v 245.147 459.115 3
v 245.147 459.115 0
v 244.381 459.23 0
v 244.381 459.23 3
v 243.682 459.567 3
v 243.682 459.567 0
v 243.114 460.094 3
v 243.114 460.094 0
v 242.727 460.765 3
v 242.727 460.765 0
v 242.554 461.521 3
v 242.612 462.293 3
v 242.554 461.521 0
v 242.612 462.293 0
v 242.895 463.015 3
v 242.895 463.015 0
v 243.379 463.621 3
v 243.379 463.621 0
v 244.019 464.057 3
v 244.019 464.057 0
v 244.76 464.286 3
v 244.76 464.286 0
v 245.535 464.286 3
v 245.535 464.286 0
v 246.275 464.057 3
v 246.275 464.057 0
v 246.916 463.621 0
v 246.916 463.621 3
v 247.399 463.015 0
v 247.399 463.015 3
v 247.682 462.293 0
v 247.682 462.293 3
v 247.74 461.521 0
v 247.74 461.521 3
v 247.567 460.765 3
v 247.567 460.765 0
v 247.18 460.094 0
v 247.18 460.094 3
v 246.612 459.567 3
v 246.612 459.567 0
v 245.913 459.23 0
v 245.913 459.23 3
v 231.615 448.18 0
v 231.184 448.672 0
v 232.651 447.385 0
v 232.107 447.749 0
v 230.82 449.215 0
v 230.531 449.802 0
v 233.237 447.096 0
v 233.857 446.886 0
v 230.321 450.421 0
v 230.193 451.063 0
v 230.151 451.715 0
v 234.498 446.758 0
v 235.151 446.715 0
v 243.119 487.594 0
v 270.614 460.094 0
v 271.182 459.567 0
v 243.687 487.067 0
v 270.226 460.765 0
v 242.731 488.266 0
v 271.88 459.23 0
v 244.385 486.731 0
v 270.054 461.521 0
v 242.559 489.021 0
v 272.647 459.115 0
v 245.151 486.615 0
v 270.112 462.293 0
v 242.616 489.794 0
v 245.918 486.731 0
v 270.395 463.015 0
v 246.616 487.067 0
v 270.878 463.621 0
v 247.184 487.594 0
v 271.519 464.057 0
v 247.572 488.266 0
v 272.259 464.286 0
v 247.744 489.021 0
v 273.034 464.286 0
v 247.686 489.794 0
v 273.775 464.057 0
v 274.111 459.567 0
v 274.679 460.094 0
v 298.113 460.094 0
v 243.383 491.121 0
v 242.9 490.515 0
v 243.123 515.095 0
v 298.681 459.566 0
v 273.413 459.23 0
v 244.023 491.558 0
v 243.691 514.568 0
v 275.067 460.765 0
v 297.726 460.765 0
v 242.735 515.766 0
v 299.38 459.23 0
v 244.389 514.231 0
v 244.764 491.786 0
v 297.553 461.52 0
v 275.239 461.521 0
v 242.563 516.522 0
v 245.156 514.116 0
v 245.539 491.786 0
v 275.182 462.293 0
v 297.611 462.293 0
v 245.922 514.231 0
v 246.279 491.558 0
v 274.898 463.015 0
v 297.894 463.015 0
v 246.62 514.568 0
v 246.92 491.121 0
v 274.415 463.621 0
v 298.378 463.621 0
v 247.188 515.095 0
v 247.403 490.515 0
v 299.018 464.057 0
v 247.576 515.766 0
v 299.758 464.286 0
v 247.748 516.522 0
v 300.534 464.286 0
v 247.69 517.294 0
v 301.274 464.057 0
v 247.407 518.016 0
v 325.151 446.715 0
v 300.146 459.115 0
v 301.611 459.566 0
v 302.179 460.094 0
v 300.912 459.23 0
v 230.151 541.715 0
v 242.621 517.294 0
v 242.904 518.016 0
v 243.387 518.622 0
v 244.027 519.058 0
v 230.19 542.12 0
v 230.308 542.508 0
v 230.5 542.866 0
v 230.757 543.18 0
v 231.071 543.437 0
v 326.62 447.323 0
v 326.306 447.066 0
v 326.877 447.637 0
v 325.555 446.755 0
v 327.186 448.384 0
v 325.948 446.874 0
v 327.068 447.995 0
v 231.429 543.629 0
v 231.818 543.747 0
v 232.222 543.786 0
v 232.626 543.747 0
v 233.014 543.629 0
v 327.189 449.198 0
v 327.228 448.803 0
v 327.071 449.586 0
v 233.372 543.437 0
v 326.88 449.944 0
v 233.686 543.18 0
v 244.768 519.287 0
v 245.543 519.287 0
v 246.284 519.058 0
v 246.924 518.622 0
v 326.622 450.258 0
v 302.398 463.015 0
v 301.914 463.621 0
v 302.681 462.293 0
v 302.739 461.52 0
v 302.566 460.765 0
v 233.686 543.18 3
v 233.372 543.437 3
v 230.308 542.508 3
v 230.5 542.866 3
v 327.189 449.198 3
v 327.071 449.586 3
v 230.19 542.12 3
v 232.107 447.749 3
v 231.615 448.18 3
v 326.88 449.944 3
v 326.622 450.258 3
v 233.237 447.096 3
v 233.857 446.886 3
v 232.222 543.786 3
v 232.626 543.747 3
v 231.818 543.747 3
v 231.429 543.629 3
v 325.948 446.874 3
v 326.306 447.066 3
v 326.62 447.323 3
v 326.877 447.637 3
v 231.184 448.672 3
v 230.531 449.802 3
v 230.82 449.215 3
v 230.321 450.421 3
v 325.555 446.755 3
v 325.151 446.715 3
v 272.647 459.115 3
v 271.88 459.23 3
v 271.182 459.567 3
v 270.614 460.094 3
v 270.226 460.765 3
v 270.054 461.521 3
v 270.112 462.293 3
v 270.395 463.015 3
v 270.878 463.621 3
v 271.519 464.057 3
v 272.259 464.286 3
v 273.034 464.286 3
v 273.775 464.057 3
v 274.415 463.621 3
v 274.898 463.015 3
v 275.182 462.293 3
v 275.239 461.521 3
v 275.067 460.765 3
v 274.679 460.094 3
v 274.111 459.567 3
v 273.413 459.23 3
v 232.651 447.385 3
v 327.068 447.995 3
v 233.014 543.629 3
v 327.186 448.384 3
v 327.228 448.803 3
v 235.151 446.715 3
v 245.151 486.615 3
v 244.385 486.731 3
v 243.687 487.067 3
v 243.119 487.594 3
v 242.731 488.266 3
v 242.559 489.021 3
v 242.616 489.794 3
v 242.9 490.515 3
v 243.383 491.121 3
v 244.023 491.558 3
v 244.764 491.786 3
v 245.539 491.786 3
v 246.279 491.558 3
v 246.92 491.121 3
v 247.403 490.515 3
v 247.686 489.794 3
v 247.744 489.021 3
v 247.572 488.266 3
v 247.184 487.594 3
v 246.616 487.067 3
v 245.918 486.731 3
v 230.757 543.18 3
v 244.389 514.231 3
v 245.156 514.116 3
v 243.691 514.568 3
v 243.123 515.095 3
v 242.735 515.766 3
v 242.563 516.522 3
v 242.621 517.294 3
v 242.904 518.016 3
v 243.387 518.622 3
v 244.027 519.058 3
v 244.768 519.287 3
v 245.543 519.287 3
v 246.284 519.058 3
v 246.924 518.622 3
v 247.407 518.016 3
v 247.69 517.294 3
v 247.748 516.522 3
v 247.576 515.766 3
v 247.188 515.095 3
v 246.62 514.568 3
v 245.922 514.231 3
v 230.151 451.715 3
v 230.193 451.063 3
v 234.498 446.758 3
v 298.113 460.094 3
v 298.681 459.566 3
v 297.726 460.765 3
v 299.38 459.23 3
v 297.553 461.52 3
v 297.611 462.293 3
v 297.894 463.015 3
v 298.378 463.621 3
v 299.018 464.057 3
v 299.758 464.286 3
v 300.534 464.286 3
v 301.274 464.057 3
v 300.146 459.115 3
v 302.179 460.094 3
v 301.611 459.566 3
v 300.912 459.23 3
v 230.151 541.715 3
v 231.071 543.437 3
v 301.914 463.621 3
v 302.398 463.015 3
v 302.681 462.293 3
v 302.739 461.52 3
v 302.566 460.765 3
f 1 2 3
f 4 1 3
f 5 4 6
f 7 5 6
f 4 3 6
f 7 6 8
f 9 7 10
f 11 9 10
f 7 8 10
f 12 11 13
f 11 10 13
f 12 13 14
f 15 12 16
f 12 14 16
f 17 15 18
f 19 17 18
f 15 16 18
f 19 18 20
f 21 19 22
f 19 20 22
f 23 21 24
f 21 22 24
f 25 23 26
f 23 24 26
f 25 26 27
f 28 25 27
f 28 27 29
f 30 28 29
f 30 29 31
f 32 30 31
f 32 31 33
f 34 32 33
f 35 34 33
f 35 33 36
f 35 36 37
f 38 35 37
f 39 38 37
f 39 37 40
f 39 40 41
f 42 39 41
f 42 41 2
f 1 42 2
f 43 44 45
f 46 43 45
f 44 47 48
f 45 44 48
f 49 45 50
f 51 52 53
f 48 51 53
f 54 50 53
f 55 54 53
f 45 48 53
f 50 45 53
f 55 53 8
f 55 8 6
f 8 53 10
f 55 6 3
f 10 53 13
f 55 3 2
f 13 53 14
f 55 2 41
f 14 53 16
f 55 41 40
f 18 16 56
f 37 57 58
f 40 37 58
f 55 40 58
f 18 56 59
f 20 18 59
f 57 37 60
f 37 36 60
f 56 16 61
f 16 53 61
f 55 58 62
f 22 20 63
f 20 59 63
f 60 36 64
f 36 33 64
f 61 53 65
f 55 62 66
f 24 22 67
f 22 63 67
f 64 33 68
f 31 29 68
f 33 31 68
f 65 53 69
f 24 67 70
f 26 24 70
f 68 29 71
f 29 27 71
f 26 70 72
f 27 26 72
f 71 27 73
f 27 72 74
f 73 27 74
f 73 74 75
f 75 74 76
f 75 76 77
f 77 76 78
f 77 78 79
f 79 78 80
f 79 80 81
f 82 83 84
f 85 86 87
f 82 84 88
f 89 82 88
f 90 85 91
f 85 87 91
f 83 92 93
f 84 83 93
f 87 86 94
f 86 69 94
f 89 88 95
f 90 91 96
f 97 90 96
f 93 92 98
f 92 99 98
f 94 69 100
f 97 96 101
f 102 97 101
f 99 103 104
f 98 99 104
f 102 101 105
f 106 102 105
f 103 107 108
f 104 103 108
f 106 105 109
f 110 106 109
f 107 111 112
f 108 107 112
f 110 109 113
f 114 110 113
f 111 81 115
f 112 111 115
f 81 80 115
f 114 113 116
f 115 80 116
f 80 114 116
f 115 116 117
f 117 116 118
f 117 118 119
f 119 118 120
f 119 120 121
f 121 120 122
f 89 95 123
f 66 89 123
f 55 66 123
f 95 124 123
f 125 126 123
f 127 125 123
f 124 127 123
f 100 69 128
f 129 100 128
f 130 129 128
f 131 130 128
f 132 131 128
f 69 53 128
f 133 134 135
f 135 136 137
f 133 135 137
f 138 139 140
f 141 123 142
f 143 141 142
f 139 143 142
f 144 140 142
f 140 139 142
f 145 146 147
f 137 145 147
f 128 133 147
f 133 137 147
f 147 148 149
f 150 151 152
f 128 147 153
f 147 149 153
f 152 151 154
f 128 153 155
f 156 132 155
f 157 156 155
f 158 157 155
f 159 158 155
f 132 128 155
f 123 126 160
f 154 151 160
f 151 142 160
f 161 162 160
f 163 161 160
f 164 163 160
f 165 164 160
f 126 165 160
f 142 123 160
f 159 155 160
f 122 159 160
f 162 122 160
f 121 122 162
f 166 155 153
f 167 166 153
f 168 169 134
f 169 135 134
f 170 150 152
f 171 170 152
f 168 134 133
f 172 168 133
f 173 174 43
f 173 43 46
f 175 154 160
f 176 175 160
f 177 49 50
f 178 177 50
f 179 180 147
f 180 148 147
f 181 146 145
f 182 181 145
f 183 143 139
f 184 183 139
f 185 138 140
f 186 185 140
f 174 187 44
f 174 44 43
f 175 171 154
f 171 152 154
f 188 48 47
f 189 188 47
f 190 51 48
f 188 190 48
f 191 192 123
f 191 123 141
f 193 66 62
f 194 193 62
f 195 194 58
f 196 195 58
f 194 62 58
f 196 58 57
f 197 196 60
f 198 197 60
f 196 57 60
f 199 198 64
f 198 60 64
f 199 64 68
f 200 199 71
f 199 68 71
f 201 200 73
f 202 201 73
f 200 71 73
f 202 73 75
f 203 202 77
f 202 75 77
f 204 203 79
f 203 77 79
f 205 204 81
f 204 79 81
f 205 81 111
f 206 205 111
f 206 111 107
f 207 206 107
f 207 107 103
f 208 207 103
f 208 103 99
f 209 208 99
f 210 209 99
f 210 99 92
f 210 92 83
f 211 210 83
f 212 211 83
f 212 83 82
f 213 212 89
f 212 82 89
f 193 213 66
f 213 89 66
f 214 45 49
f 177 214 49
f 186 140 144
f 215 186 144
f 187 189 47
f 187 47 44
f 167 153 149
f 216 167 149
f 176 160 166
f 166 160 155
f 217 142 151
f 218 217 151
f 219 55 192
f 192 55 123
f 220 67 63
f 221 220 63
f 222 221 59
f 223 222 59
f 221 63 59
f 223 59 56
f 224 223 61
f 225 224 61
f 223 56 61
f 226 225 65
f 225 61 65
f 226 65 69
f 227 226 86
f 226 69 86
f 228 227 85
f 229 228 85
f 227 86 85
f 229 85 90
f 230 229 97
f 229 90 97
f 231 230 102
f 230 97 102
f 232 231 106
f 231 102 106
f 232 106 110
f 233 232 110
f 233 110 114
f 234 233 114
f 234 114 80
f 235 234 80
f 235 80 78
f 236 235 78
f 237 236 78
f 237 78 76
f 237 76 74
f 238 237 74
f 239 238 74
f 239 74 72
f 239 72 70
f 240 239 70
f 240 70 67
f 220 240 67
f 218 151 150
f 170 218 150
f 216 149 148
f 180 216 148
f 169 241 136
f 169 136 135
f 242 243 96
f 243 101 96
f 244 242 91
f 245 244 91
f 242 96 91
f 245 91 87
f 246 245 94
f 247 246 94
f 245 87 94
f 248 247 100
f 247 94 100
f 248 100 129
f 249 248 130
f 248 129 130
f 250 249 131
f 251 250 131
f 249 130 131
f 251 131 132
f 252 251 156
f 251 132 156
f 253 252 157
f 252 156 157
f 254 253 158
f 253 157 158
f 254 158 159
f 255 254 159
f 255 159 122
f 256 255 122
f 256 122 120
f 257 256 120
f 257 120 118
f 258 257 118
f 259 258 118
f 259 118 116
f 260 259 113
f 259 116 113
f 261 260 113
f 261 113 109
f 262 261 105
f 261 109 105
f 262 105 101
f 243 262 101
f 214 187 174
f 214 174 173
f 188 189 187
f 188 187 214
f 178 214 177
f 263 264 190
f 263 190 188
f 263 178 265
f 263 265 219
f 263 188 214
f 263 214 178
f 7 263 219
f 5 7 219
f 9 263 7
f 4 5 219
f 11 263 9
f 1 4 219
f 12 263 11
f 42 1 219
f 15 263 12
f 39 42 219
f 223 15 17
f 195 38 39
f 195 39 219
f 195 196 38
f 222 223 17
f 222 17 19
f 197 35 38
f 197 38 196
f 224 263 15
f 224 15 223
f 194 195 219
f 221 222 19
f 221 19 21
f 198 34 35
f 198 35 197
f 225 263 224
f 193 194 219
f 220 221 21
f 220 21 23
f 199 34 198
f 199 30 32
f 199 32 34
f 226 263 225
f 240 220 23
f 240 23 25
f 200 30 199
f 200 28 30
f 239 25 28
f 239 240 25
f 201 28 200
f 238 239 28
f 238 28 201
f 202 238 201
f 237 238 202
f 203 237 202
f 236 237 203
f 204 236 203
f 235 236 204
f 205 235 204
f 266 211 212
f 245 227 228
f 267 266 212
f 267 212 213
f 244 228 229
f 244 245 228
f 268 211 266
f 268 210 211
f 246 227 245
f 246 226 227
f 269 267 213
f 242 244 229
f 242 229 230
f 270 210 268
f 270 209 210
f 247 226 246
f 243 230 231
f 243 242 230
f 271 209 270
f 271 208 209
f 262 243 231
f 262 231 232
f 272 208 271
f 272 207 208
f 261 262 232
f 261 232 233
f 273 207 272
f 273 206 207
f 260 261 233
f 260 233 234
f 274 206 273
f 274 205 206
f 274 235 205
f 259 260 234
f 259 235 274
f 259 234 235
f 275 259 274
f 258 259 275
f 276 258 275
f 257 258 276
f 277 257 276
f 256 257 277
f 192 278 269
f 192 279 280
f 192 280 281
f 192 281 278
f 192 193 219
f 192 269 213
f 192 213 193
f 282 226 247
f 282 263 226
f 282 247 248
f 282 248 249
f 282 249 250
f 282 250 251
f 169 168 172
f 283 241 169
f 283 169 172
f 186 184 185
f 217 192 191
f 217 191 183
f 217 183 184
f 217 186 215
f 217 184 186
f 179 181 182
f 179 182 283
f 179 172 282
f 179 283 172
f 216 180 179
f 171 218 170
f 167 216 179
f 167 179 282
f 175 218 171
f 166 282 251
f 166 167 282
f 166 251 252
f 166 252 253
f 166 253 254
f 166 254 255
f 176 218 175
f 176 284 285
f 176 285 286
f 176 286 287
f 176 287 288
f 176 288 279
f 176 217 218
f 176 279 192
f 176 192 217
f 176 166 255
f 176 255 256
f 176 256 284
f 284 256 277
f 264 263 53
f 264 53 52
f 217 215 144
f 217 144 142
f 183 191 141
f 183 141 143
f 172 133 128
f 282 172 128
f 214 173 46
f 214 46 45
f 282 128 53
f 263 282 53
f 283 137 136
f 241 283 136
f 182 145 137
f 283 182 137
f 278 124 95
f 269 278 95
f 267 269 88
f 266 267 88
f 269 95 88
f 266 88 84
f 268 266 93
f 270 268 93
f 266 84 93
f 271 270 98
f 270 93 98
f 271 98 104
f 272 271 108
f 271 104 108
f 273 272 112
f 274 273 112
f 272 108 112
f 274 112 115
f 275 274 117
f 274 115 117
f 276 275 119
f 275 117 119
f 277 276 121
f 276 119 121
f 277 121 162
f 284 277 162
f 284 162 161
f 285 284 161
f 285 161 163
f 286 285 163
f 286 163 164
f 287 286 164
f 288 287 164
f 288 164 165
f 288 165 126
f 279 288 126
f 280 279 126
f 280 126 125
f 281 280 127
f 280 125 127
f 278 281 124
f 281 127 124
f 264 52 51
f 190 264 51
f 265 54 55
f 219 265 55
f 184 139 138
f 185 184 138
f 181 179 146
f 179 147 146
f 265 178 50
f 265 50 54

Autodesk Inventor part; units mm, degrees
ref_plane "YZ Plane" through (0, 0, 0) normal (1, 0, 0) x (0, 1, 0)
ref_plane "XZ Plane" through (0, 0, 0) normal (0, 1, 0) x (-1, 0, 0)
ref_plane "XY Plane" through (0, 0, 0) normal (0, 0, 1) x (1, 0, 0)
sketch "Sketch1" plane through (0, 0, 0) normal (0, 0, 1) x (1, 0, 0)
  line L0 (327.1886, 449.1983) -> (327.071, 449.5859)
  line L1 (327.071, 449.5859) -> (326.8796, 449.944)
  line L2 (326.8796, 449.944) -> (326.6221, 450.2578)
  line L3 (326.6221, 450.2578) -> (233.6862, 543.1798)
  line L4 (233.6862, 543.1798) -> (233.3723, 543.4374)
  line L5 (233.3723, 543.4374) -> (233.0143, 543.6288)
  line L6 (233.0143, 543.6288) -> (232.6258, 543.7467)
  line L7 (232.6258, 543.7467) -> (232.2217, 543.7864)
  line L8 (232.2217, 543.7864) -> (231.8177, 543.7467)
  line L9 (231.8177, 543.7467) -> (231.4291, 543.6288)
  line L10 (231.4291, 543.6288) -> (231.0711, 543.4374)
  line L11 (231.0711, 543.4374) -> (230.7573, 543.1799)
  line L12 (230.7573, 543.1799) -> (230.4997, 542.866)
  line L13 (230.4997, 542.866) -> (230.3083, 542.508)
  line L14 (230.3083, 542.508) -> (230.1905, 542.1195)
  line L15 (230.1905, 542.1195) -> (230.1507, 541.7154)
  line L16 (230.1507, 541.7154) -> (230.1507, 451.7154)
  line L17 (230.1507, 451.7154) -> (230.1934, 451.0627)
  line L18 (230.1934, 451.0627) -> (230.321, 450.4213)
  line L19 (230.321, 450.4213) -> (230.5313, 449.802)
  line L20 (230.5313, 449.802) -> (230.8205, 449.2154)
  line L21 (230.8205, 449.2154) -> (231.1839, 448.6716)
  line L22 (231.1839, 448.6716) -> (231.6151, 448.1799)
  line L23 (231.6151, 448.1799) -> (232.1069, 447.7486)
  line L24 (232.1069, 447.7486) -> (232.6507, 447.3853)
  line L25 (232.6507, 447.3853) -> (233.2372, 447.096)
  line L26 (233.2372, 447.096) -> (233.8566, 446.8858)
  line L27 (233.8566, 446.8858) -> (234.498, 446.7582)
  line L28 (234.498, 446.7582) -> (235.1507, 446.7154)
  line L29 (235.1507, 446.7154) -> (325.1506, 446.7154)
  line L30 (325.1506, 446.7154) -> (325.5547, 446.7551)
  line L31 (325.5547, 446.7551) -> (325.9476, 446.8743)
  line L32 (325.9476, 446.8743) -> (326.3056, 447.0657)
  line L33 (326.3056, 447.0657) -> (326.6195, 447.3233)
  line L34 (326.6195, 447.3233) -> (326.877, 447.6371)
  line L35 (326.877, 447.6371) -> (327.0684, 447.9951)
  line L36 (327.0684, 447.9951) -> (327.1863, 448.3837)
  line L37 (327.1863, 448.3837) -> (327.2275, 448.8028)
  line L38 (327.2275, 448.8028) -> (327.1886, 449.1983)
  line L39 (302.5802, 462.3669) -> (302.3285, 462.9747)
  line L40 (302.3285, 462.9747) -> (301.928, 463.4966)
  line L41 (301.928, 463.4966) -> (301.4061, 463.8971)
  line L42 (301.4061, 463.8971) -> (300.7984, 464.1488)
  line L43 (300.7984, 464.1488) -> (300.1461, 464.2347)
  line L44 (300.1461, 464.2347) -> (299.4939, 464.1489)
  line L45 (299.4939, 464.1489) -> (298.8861, 463.8972)
  line L46 (298.8861, 463.8972) -> (298.3642, 463.4967)
  line L47 (298.3642, 463.4967) -> (297.9637, 462.9748)
  line L48 (297.9637, 462.9748) -> (297.7119, 462.367)
  line L49 (297.7119, 462.367) -> (297.6261, 461.7148)
  line L50 (297.6261, 461.7148) -> (297.7119, 461.0625)
  line L51 (297.7119, 461.0625) -> (297.9636, 460.4548)
  line L52 (297.9636, 460.4548) -> (298.3641, 459.9328)
  line L53 (298.3641, 459.9328) -> (298.886, 459.5323)
  line L54 (298.886, 459.5323) -> (299.4937, 459.2806)
  line L55 (299.4937, 459.2806) -> (300.1459, 459.1948)
  line L56 (300.1459, 459.1948) -> (300.7982, 459.2805)
  line L57 (300.7982, 459.2805) -> (301.406, 459.5323)
  line L58 (301.406, 459.5323) -> (301.9279, 459.9327)
  line L59 (301.9279, 459.9327) -> (302.3284, 460.4546)
  line L60 (302.3284, 460.4546) -> (302.5801, 461.0624)
  line L61 (302.5801, 461.0624) -> (302.666, 461.7147)
  line L62 (302.666, 461.7147) -> (302.5802, 462.3669)
  line L63 (247.5897, 517.3681) -> (247.338, 517.9759)
  line L64 (247.338, 517.9759) -> (246.9375, 518.4978)
  line L65 (246.9375, 518.4978) -> (246.4156, 518.8983)
  line L66 (246.4156, 518.8983) -> (245.8078, 519.15)
  line L67 (245.8078, 519.15) -> (245.1556, 519.2359)
  line L68 (245.1556, 519.2359) -> (244.5033, 519.1501)
  line L69 (244.5033, 519.1501) -> (243.8956, 518.8984)
  line L70 (243.8956, 518.8984) -> (243.3736, 518.4979)
  line L71 (243.3736, 518.4979) -> (242.9731, 517.976)
  line L72 (242.9731, 517.976) -> (242.7214, 517.3683)
  line L73 (242.7214, 517.3683) -> (242.6356, 516.716)
  line L74 (242.6356, 516.716) -> (242.7213, 516.0638)
  line L75 (242.7213, 516.0638) -> (242.9731, 515.456)
  line L76 (242.9731, 515.456) -> (243.3736, 514.9341)
  line L77 (243.3736, 514.9341) -> (243.8954, 514.5336)
  line L78 (243.8954, 514.5336) -> (244.5032, 514.2818)
  line L79 (244.5032, 514.2818) -> (245.1554, 514.196)
  line L80 (245.1554, 514.196) -> (245.8077, 514.2817)
  line L81 (245.8077, 514.2817) -> (246.4154, 514.5335)
  line L82 (246.4154, 514.5335) -> (246.9373, 514.9339)
  line L83 (246.9373, 514.9339) -> (247.3379, 515.4559)
  line L84 (247.3379, 515.4559) -> (247.5896, 516.0636)
  line L85 (247.5896, 516.0636) -> (247.6755, 516.7159)
  line L86 (247.6755, 516.7159) -> (247.5897, 517.3681)
  line L87 (275.0808, 462.367) -> (274.8291, 462.9747)
  line L88 (274.8291, 462.9747) -> (274.4286, 463.4966)
  line L89 (274.4286, 463.4966) -> (273.9067, 463.8971)
  line L90 (273.9067, 463.8971) -> (273.2989, 464.1489)
  line L91 (273.2989, 464.1489) -> (272.6467, 464.2347)
  line L92 (272.6467, 464.2347) -> (271.9945, 464.149)
  line L93 (271.9945, 464.149) -> (271.3867, 463.8972)
  line L94 (271.3867, 463.8972) -> (270.8647, 463.4967)
  line L95 (270.8647, 463.4967) -> (270.4643, 462.9749)
  line L96 (270.4643, 462.9749) -> (270.2125, 462.3671)
  line L97 (270.2125, 462.3671) -> (270.1267, 461.7149)
  line L98 (270.1267, 461.7149) -> (270.2124, 461.0626)
  line L99 (270.2124, 461.0626) -> (270.4642, 460.4549)
  line L100 (270.4642, 460.4549) -> (270.8646, 459.9329)
  line L101 (270.8646, 459.9329) -> (271.3865, 459.5324)
  line L102 (271.3865, 459.5324) -> (271.9943, 459.2807)
  line L103 (271.9943, 459.2807) -> (272.6465, 459.1948)
  line L104 (272.6465, 459.1948) -> (273.2987, 459.2806)
  line L105 (273.2987, 459.2806) -> (273.9065, 459.5323)
  line L106 (273.9065, 459.5323) -> (274.4285, 459.9328)
  line L107 (274.4285, 459.9328) -> (274.829, 460.4547)
  line L108 (274.829, 460.4547) -> (275.0807, 461.0625)
  line L109 (275.0807, 461.0625) -> (275.1665, 461.7146)
  line L110 (275.1665, 461.7146) -> (275.0808, 462.367)
  line L111 (247.5813, 462.367) -> (247.3296, 462.9748)
  line L112 (247.3296, 462.9748) -> (246.9291, 463.4967)
  line L113 (246.9291, 463.4967) -> (246.4072, 463.8972)
  line L114 (246.4072, 463.8972) -> (245.7994, 464.1489)
  line L115 (245.7994, 464.1489) -> (245.1472, 464.2348)
  line L116 (245.1472, 464.2348) -> (244.495, 464.149)
  line L117 (244.495, 464.149) -> (243.8872, 463.8973)
  line L118 (243.8872, 463.8973) -> (243.3653, 463.4968)
  line L119 (243.3653, 463.4968) -> (242.9648, 462.9749)
  line L120 (242.9648, 462.9749) -> (242.713, 462.3671)
  line L121 (242.713, 462.3671) -> (242.6272, 461.7149)
  line L122 (242.6272, 461.7149) -> (242.713, 461.0627)
  line L123 (242.713, 461.0627) -> (242.9647, 460.4549)
  line L124 (242.9647, 460.4549) -> (243.3652, 459.933)
  line L125 (243.3652, 459.933) -> (243.8871, 459.5325)
  line L126 (243.8871, 459.5325) -> (244.4948, 459.2808)
  line L127 (244.4948, 459.2808) -> (245.147, 459.1949)
  line L128 (245.147, 459.1949) -> (245.7993, 459.2807)
  line L129 (245.7993, 459.2807) -> (246.4071, 459.5324)
  line L130 (246.4071, 459.5324) -> (246.929, 459.9329)
  line L131 (246.929, 459.9329) -> (247.3295, 460.4548)
  line L132 (247.3295, 460.4548) -> (247.5812, 461.0625)
  line L133 (247.5812, 461.0625) -> (247.6671, 461.7149)
  line L134 (247.6671, 461.7149) -> (247.5813, 462.367)
  line L135 (247.5854, 489.8677) -> (247.3337, 490.4753)
  line L136 (247.3337, 490.4753) -> (246.9332, 490.9973)
  line L137 (246.9332, 490.9973) -> (246.4114, 491.3978)
  line L138 (246.4114, 491.3978) -> (245.8036, 491.6495)
  line L139 (245.8036, 491.6495) -> (245.1514, 491.7354)
  line L140 (245.1514, 491.7354) -> (244.4991, 491.6496)
  line L141 (244.4991, 491.6496) -> (243.8914, 491.3979)
  line L142 (243.8914, 491.3979) -> (243.3694, 490.9974)
  line L143 (243.3694, 490.9974) -> (242.9689, 490.4755)
  line L144 (242.9689, 490.4755) -> (242.7172, 489.8677)
  line L145 (242.7172, 489.8677) -> (242.6313, 489.2155)
  line L146 (242.6313, 489.2155) -> (242.7171, 488.5632)
  line L147 (242.7171, 488.5632) -> (242.9688, 487.9555)
  line L148 (242.9688, 487.9555) -> (243.3693, 487.4335)
  line L149 (243.3693, 487.4335) -> (243.8912, 487.033)
  line L150 (243.8912, 487.033) -> (244.499, 486.7813)
  line L151 (244.499, 486.7813) -> (245.1512, 486.6954)
  line L152 (245.1512, 486.6954) -> (245.8034, 486.7812)
  line L153 (245.8034, 486.7812) -> (246.4112, 487.0329)
  line L154 (246.4112, 487.0329) -> (246.9331, 487.4334)
  line L155 (246.9331, 487.4334) -> (247.3336, 487.9553)
  line L156 (247.3336, 487.9553) -> (247.5853, 488.563)
  line L157 (247.5853, 488.563) -> (247.6712, 489.2153)
  line L158 (247.6712, 489.2153) -> (247.5854, 489.8677)
  point P0 (0, 0)
extrude "Extrusion1" add sketch "Sketch1" along normal blind 3
sketch "Sketch2" plane through (0, 0, 3) normal (0, 0, 1) x (1, 0, 0)
  line L0 (247.5897, 517.3681) -> (247.6755, 516.7159) projected
  line L1 (247.6755, 516.7159) -> (247.5896, 516.0636) projected
  line L2 (247.5896, 516.0636) -> (247.3379, 515.4559) projected
  line L3 (247.3379, 515.4559) -> (246.9373, 514.9339) projected
  line L4 (246.9373, 514.9339) -> (246.4154, 514.5335) projected
  line L5 (246.4154, 514.5335) -> (245.8077, 514.2817) projected
  line L6 (245.8077, 514.2817) -> (245.1554, 514.196) projected
  line L7 (245.1554, 514.196) -> (244.5032, 514.2818) projected
  line L8 (244.5032, 514.2818) -> (243.8954, 514.5336) projected
  line L9 (243.8954, 514.5336) -> (243.3736, 514.9341) projected
  line L10 (243.3736, 514.9341) -> (242.9731, 515.456) projected
  line L11 (242.9731, 515.456) -> (242.7213, 516.0638) projected
  line L12 (242.7213, 516.0638) -> (242.6356, 516.716) projected
  line L13 (242.6356, 516.716) -> (242.7214, 517.3683) projected
  line L14 (242.7214, 517.3683) -> (242.9731, 517.976) projected
  line L15 (242.9731, 517.976) -> (243.3736, 518.4979) projected
  line L16 (243.3736, 518.4979) -> (243.8956, 518.8984) projected
  line L17 (243.8956, 518.8984) -> (244.5033, 519.1501) projected
  line L18 (244.5033, 519.1501) -> (245.1556, 519.2359) projected
  line L19 (245.1556, 519.2359) -> (245.8078, 519.15) projected
  line L20 (245.8078, 519.15) -> (246.4156, 518.8983) projected
  line L21 (246.4156, 518.8983) -> (246.9375, 518.4978) projected
  line L22 (246.9375, 518.4978) -> (247.338, 517.9759) projected
  line L23 (247.338, 517.9759) -> (247.5897, 517.3681) projected
  line L24 (247.5854, 489.8677) -> (247.6712, 489.2153) projected
  line L25 (247.6712, 489.2153) -> (247.5853, 488.563) projected
  line L26 (247.5853, 488.563) -> (247.3336, 487.9553) projected
  line L27 (247.3336, 487.9553) -> (246.9331, 487.4334) projected
  line L28 (246.9331, 487.4334) -> (246.4112, 487.0329) projected
  line L29 (246.4112, 487.0329) -> (245.8034, 486.7812) projected
  line L30 (245.8034, 486.7812) -> (245.1512, 486.6954) projected
  line L31 (245.1512, 486.6954) -> (244.499, 486.7813) projected
  line L32 (244.499, 486.7813) -> (243.8912, 487.033) projected
  line L33 (243.8912, 487.033) -> (243.3693, 487.4335) projected
  line L34 (243.3693, 487.4335) -> (242.9688, 487.9555) projected
  line L35 (242.9688, 487.9555) -> (242.7171, 488.5632) projected
  line L36 (242.7171, 488.5632) -> (242.6313, 489.2155) projected
  line L37 (242.6313, 489.2155) -> (242.7172, 489.8677) projected
  line L38 (242.7172, 489.8677) -> (242.9689, 490.4755) projected
  line L39 (242.9689, 490.4755) -> (243.3694, 490.9974) projected
  line L40 (243.3694, 490.9974) -> (243.8914, 491.3979) projected
  line L41 (243.8914, 491.3979) -> (244.4991, 491.6496) projected
  line L42 (244.4991, 491.6496) -> (245.1514, 491.7354) projected
  line L43 (245.1514, 491.7354) -> (245.8036, 491.6495) projected
  line L44 (245.8036, 491.6495) -> (246.4114, 491.3978) projected
  line L45 (246.4114, 491.3978) -> (246.9332, 490.9973) projected
  line L46 (246.9332, 490.9973) -> (247.3337, 490.4753) projected
  line L47 (247.3337, 490.4753) -> (247.5854, 489.8677) projected
  line L48 (302.5802, 462.3669) -> (302.666, 461.7147) projected
  line L49 (302.666, 461.7147) -> (302.5801, 461.0624) projected
  line L50 (302.5801, 461.0624) -> (302.3284, 460.4546) projected
  line L51 (302.3284, 460.4546) -> (301.9279, 459.9327) projected
  line L52 (301.9279, 459.9327) -> (301.406, 459.5323) projected
  line L53 (301.406, 459.5323) -> (300.7982, 459.2805) projected
  line L54 (300.7982, 459.2805) -> (300.1459, 459.1948) projected
  line L55 (300.1459, 459.1948) -> (299.4937, 459.2806) projected
  line L56 (299.4937, 459.2806) -> (298.886, 459.5323) projected
  line L57 (298.886, 459.5323) -> (298.3641, 459.9328) projected
  line L58 (298.3641, 459.9328) -> (297.9636, 460.4548) projected
  line L59 (297.9636, 460.4548) -> (297.7119, 461.0625) projected
  line L60 (297.7119, 461.0625) -> (297.6261, 461.7148) projected
  line L61 (297.6261, 461.7148) -> (297.7119, 462.367) projected
  line L62 (297.7119, 462.367) -> (297.9637, 462.9748) projected
  line L63 (297.9637, 462.9748) -> (298.3642, 463.4967) projected
  line L64 (298.3642, 463.4967) -> (298.8861, 463.8972) projected
  line L65 (298.8861, 463.8972) -> (299.4939, 464.1489) projected
  line L66 (299.4939, 464.1489) -> (300.1461, 464.2347) projected
  line L67 (300.1461, 464.2347) -> (300.7984, 464.1488) projected
  line L68 (300.7984, 464.1488) -> (301.4061, 463.8971) projected
  line L69 (301.4061, 463.8971) -> (301.928, 463.4966) projected
  line L70 (301.928, 463.4966) -> (302.3285, 462.9747) projected
  line L71 (302.3285, 462.9747) -> (302.5802, 462.3669) projected
  line L72 (247.5813, 462.367) -> (247.6671, 461.7149) projected
  line L73 (247.6671, 461.7149) -> (247.5812, 461.0625) projected
  line L74 (247.5812, 461.0625) -> (247.3295, 460.4548) projected
  line L75 (247.3295, 460.4548) -> (246.929, 459.9329) projected
  line L76 (246.929, 459.9329) -> (246.4071, 459.5324) projected
  line L77 (246.4071, 459.5324) -> (245.7993, 459.2807) projected
  line L78 (245.7993, 459.2807) -> (245.147, 459.1949) projected
  line L79 (245.147, 459.1949) -> (244.4948, 459.2808) projected
  line L80 (244.4948, 459.2808) -> (243.8871, 459.5325) projected
  line L81 (243.8871, 459.5325) -> (243.3652, 459.933) projected
  line L82 (243.3652, 459.933) -> (242.9647, 460.4549) projected
  line L83 (242.9647, 460.4549) -> (242.713, 461.0627) projected
  line L84 (242.713, 461.0627) -> (242.6272, 461.7149) projected
  line L85 (242.6272, 461.7149) -> (242.713, 462.3671) projected
  line L86 (242.713, 462.3671) -> (242.9648, 462.9749) projected
  line L87 (242.9648, 462.9749) -> (243.3653, 463.4968) projected
  line L88 (243.3653, 463.4968) -> (243.8872, 463.8973) projected
  line L89 (243.8872, 463.8973) -> (244.495, 464.149) projected
  line L90 (244.495, 464.149) -> (245.1472, 464.2348) projected
  line L91 (245.1472, 464.2348) -> (245.7994, 464.1489) projected
  line L92 (245.7994, 464.1489) -> (246.4072, 463.8972) projected
  line L93 (246.4072, 463.8972) -> (246.9291, 463.4967) projected
  line L94 (246.9291, 463.4967) -> (247.3296, 462.9748) projected
  line L95 (247.3296, 462.9748) -> (247.5813, 462.367) projected
  line L96 (275.0808, 462.367) -> (275.1665, 461.7146) projected
  line L97 (275.1665, 461.7146) -> (275.0807, 461.0625) projected
  line L98 (275.0807, 461.0625) -> (274.829, 460.4547) projected
  line L99 (274.829, 460.4547) -> (274.4285, 459.9328) projected
  line L100 (274.4285, 459.9328) -> (273.9065, 459.5323) projected
  line L101 (273.9065, 459.5323) -> (273.2987, 459.2806) projected
  line L102 (273.2987, 459.2806) -> (272.6465, 459.1948) projected
  line L103 (272.6465, 459.1948) -> (271.9943, 459.2807) projected
  line L104 (271.9943, 459.2807) -> (271.3865, 459.5324) projected
  line L105 (271.3865, 459.5324) -> (270.8646, 459.9329) projected
  line L106 (270.8646, 459.9329) -> (270.4642, 460.4549) projected
  line L107 (270.4642, 460.4549) -> (270.2124, 461.0626) projected
  line L108 (270.2124, 461.0626) -> (270.1267, 461.7149) projected
  line L109 (270.1267, 461.7149) -> (270.2125, 462.3671) projected
  line L110 (270.2125, 462.3671) -> (270.4643, 462.9749) projected
  line L111 (270.4643, 462.9749) -> (270.8647, 463.4967) projected
  line L112 (270.8647, 463.4967) -> (271.3867, 463.8972) projected
  line L113 (271.3867, 463.8972) -> (271.9945, 464.149) projected
  line L114 (271.9945, 464.149) -> (272.6467, 464.2347) projected
  line L115 (272.6467, 464.2347) -> (273.2989, 464.1489) projected
  line L116 (273.2989, 464.1489) -> (273.9067, 463.8971) projected
  line L117 (273.9067, 463.8971) -> (274.4286, 463.4966) projected
  line L118 (274.4286, 463.4966) -> (274.8291, 462.9747) projected
  line L119 (274.8291, 462.9747) -> (275.0808, 462.367) projected
  line L120 (327.1886, 449.1983) -> (327.071, 449.5859) projected
  line L121 (327.071, 449.5859) -> (326.8796, 449.944) projected
  line L122 (326.8796, 449.944) -> (326.6221, 450.2578) projected
  line L123 (326.6221, 450.2578) -> (233.6862, 543.1798) projected
  line L124 (233.6862, 543.1798) -> (233.3723, 543.4374) projected
  line L125 (233.3723, 543.4374) -> (233.0143, 543.6288) projected
  line L126 (233.0143, 543.6288) -> (232.6258, 543.7467) projected
  line L127 (232.6258, 543.7467) -> (232.2217, 543.7864) projected
  line L128 (232.2217, 543.7864) -> (231.8177, 543.7467) projected
  line L129 (231.8177, 543.7467) -> (231.4291, 543.6288) projected
  line L130 (231.4291, 543.6288) -> (231.0711, 543.4374) projected
  line L131 (231.0711, 543.4374) -> (230.7573, 543.1799) projected
  line L132 (230.7573, 543.1799) -> (230.4997, 542.866) projected
  line L133 (230.4997, 542.866) -> (230.3083, 542.508) projected
  line L134 (230.3083, 542.508) -> (230.1905, 542.1195) projected
  line L135 (230.1905, 542.1195) -> (230.1507, 541.7154) projected
  line L136 (230.1507, 541.7154) -> (230.1507, 451.7154) projected
  line L137 (230.1507, 451.7154) -> (230.1934, 451.0627) projected
  line L138 (230.1934, 451.0627) -> (230.321, 450.4213) projected
  line L139 (230.321, 450.4213) -> (230.5313, 449.802) projected
  line L140 (230.5313, 449.802) -> (230.8205, 449.2154) projected
  line L141 (230.8205, 449.2154) -> (231.1839, 448.6716) projected
  line L142 (231.1839, 448.6716) -> (231.6151, 448.1799) projected
  line L143 (231.6151, 448.1799) -> (232.1069, 447.7486) projected
  line L144 (232.1069, 447.7486) -> (232.6507, 447.3853) projected
  line L145 (232.6507, 447.3853) -> (233.2372, 447.096) projected
  line L146 (233.2372, 447.096) -> (233.8566, 446.8858) projected
  line L147 (233.8566, 446.8858) -> (234.498, 446.7582) projected
  line L148 (234.498, 446.7582) -> (235.1507, 446.7154) projected
  line L149 (235.1507, 446.7154) -> (325.1506, 446.7154) projected
  line L150 (325.1506, 446.7154) -> (325.5547, 446.7551) projected
  line L151 (325.5547, 446.7551) -> (325.9476, 446.8743) projected
  line L152 (325.9476, 446.8743) -> (326.3056, 447.0657) projected
  line L153 (326.3056, 447.0657) -> (326.6195, 447.3233) projected
  line L154 (326.6195, 447.3233) -> (326.877, 447.6371) projected
  line L155 (326.877, 447.6371) -> (327.0684, 447.9951) projected
  line L156 (327.0684, 447.9951) -> (327.1863, 448.3837) projected
  line L157 (327.1863, 448.3837) -> (327.2275, 448.8028) projected
  line L158 (327.2275, 448.8028) -> (327.1886, 449.1983) projected
  circle A0 centre (300.146, 461.7147) radius 2.4985
  circle A1 centre (272.6467, 461.7148) radius 2.4985
  circle A2 centre (245.1471, 461.7148) radius 2.4984
  circle A3 centre (245.1513, 489.2154) radius 2.4985
  circle A4 centre (245.1555, 516.7159) radius 2.4984
  point P0 (0, 0)
hole "Hole1" at (245.1555, 516.7159, 3) at (245.1513, 489.2154, 3) at (245.1471, 461.7148, 3) at (272.6467, 461.7148, 3) at (300.146, 461.7147, 3) direction (0, 0, -1) diameter 5.2 end through all
properties part number "Front Brace"
